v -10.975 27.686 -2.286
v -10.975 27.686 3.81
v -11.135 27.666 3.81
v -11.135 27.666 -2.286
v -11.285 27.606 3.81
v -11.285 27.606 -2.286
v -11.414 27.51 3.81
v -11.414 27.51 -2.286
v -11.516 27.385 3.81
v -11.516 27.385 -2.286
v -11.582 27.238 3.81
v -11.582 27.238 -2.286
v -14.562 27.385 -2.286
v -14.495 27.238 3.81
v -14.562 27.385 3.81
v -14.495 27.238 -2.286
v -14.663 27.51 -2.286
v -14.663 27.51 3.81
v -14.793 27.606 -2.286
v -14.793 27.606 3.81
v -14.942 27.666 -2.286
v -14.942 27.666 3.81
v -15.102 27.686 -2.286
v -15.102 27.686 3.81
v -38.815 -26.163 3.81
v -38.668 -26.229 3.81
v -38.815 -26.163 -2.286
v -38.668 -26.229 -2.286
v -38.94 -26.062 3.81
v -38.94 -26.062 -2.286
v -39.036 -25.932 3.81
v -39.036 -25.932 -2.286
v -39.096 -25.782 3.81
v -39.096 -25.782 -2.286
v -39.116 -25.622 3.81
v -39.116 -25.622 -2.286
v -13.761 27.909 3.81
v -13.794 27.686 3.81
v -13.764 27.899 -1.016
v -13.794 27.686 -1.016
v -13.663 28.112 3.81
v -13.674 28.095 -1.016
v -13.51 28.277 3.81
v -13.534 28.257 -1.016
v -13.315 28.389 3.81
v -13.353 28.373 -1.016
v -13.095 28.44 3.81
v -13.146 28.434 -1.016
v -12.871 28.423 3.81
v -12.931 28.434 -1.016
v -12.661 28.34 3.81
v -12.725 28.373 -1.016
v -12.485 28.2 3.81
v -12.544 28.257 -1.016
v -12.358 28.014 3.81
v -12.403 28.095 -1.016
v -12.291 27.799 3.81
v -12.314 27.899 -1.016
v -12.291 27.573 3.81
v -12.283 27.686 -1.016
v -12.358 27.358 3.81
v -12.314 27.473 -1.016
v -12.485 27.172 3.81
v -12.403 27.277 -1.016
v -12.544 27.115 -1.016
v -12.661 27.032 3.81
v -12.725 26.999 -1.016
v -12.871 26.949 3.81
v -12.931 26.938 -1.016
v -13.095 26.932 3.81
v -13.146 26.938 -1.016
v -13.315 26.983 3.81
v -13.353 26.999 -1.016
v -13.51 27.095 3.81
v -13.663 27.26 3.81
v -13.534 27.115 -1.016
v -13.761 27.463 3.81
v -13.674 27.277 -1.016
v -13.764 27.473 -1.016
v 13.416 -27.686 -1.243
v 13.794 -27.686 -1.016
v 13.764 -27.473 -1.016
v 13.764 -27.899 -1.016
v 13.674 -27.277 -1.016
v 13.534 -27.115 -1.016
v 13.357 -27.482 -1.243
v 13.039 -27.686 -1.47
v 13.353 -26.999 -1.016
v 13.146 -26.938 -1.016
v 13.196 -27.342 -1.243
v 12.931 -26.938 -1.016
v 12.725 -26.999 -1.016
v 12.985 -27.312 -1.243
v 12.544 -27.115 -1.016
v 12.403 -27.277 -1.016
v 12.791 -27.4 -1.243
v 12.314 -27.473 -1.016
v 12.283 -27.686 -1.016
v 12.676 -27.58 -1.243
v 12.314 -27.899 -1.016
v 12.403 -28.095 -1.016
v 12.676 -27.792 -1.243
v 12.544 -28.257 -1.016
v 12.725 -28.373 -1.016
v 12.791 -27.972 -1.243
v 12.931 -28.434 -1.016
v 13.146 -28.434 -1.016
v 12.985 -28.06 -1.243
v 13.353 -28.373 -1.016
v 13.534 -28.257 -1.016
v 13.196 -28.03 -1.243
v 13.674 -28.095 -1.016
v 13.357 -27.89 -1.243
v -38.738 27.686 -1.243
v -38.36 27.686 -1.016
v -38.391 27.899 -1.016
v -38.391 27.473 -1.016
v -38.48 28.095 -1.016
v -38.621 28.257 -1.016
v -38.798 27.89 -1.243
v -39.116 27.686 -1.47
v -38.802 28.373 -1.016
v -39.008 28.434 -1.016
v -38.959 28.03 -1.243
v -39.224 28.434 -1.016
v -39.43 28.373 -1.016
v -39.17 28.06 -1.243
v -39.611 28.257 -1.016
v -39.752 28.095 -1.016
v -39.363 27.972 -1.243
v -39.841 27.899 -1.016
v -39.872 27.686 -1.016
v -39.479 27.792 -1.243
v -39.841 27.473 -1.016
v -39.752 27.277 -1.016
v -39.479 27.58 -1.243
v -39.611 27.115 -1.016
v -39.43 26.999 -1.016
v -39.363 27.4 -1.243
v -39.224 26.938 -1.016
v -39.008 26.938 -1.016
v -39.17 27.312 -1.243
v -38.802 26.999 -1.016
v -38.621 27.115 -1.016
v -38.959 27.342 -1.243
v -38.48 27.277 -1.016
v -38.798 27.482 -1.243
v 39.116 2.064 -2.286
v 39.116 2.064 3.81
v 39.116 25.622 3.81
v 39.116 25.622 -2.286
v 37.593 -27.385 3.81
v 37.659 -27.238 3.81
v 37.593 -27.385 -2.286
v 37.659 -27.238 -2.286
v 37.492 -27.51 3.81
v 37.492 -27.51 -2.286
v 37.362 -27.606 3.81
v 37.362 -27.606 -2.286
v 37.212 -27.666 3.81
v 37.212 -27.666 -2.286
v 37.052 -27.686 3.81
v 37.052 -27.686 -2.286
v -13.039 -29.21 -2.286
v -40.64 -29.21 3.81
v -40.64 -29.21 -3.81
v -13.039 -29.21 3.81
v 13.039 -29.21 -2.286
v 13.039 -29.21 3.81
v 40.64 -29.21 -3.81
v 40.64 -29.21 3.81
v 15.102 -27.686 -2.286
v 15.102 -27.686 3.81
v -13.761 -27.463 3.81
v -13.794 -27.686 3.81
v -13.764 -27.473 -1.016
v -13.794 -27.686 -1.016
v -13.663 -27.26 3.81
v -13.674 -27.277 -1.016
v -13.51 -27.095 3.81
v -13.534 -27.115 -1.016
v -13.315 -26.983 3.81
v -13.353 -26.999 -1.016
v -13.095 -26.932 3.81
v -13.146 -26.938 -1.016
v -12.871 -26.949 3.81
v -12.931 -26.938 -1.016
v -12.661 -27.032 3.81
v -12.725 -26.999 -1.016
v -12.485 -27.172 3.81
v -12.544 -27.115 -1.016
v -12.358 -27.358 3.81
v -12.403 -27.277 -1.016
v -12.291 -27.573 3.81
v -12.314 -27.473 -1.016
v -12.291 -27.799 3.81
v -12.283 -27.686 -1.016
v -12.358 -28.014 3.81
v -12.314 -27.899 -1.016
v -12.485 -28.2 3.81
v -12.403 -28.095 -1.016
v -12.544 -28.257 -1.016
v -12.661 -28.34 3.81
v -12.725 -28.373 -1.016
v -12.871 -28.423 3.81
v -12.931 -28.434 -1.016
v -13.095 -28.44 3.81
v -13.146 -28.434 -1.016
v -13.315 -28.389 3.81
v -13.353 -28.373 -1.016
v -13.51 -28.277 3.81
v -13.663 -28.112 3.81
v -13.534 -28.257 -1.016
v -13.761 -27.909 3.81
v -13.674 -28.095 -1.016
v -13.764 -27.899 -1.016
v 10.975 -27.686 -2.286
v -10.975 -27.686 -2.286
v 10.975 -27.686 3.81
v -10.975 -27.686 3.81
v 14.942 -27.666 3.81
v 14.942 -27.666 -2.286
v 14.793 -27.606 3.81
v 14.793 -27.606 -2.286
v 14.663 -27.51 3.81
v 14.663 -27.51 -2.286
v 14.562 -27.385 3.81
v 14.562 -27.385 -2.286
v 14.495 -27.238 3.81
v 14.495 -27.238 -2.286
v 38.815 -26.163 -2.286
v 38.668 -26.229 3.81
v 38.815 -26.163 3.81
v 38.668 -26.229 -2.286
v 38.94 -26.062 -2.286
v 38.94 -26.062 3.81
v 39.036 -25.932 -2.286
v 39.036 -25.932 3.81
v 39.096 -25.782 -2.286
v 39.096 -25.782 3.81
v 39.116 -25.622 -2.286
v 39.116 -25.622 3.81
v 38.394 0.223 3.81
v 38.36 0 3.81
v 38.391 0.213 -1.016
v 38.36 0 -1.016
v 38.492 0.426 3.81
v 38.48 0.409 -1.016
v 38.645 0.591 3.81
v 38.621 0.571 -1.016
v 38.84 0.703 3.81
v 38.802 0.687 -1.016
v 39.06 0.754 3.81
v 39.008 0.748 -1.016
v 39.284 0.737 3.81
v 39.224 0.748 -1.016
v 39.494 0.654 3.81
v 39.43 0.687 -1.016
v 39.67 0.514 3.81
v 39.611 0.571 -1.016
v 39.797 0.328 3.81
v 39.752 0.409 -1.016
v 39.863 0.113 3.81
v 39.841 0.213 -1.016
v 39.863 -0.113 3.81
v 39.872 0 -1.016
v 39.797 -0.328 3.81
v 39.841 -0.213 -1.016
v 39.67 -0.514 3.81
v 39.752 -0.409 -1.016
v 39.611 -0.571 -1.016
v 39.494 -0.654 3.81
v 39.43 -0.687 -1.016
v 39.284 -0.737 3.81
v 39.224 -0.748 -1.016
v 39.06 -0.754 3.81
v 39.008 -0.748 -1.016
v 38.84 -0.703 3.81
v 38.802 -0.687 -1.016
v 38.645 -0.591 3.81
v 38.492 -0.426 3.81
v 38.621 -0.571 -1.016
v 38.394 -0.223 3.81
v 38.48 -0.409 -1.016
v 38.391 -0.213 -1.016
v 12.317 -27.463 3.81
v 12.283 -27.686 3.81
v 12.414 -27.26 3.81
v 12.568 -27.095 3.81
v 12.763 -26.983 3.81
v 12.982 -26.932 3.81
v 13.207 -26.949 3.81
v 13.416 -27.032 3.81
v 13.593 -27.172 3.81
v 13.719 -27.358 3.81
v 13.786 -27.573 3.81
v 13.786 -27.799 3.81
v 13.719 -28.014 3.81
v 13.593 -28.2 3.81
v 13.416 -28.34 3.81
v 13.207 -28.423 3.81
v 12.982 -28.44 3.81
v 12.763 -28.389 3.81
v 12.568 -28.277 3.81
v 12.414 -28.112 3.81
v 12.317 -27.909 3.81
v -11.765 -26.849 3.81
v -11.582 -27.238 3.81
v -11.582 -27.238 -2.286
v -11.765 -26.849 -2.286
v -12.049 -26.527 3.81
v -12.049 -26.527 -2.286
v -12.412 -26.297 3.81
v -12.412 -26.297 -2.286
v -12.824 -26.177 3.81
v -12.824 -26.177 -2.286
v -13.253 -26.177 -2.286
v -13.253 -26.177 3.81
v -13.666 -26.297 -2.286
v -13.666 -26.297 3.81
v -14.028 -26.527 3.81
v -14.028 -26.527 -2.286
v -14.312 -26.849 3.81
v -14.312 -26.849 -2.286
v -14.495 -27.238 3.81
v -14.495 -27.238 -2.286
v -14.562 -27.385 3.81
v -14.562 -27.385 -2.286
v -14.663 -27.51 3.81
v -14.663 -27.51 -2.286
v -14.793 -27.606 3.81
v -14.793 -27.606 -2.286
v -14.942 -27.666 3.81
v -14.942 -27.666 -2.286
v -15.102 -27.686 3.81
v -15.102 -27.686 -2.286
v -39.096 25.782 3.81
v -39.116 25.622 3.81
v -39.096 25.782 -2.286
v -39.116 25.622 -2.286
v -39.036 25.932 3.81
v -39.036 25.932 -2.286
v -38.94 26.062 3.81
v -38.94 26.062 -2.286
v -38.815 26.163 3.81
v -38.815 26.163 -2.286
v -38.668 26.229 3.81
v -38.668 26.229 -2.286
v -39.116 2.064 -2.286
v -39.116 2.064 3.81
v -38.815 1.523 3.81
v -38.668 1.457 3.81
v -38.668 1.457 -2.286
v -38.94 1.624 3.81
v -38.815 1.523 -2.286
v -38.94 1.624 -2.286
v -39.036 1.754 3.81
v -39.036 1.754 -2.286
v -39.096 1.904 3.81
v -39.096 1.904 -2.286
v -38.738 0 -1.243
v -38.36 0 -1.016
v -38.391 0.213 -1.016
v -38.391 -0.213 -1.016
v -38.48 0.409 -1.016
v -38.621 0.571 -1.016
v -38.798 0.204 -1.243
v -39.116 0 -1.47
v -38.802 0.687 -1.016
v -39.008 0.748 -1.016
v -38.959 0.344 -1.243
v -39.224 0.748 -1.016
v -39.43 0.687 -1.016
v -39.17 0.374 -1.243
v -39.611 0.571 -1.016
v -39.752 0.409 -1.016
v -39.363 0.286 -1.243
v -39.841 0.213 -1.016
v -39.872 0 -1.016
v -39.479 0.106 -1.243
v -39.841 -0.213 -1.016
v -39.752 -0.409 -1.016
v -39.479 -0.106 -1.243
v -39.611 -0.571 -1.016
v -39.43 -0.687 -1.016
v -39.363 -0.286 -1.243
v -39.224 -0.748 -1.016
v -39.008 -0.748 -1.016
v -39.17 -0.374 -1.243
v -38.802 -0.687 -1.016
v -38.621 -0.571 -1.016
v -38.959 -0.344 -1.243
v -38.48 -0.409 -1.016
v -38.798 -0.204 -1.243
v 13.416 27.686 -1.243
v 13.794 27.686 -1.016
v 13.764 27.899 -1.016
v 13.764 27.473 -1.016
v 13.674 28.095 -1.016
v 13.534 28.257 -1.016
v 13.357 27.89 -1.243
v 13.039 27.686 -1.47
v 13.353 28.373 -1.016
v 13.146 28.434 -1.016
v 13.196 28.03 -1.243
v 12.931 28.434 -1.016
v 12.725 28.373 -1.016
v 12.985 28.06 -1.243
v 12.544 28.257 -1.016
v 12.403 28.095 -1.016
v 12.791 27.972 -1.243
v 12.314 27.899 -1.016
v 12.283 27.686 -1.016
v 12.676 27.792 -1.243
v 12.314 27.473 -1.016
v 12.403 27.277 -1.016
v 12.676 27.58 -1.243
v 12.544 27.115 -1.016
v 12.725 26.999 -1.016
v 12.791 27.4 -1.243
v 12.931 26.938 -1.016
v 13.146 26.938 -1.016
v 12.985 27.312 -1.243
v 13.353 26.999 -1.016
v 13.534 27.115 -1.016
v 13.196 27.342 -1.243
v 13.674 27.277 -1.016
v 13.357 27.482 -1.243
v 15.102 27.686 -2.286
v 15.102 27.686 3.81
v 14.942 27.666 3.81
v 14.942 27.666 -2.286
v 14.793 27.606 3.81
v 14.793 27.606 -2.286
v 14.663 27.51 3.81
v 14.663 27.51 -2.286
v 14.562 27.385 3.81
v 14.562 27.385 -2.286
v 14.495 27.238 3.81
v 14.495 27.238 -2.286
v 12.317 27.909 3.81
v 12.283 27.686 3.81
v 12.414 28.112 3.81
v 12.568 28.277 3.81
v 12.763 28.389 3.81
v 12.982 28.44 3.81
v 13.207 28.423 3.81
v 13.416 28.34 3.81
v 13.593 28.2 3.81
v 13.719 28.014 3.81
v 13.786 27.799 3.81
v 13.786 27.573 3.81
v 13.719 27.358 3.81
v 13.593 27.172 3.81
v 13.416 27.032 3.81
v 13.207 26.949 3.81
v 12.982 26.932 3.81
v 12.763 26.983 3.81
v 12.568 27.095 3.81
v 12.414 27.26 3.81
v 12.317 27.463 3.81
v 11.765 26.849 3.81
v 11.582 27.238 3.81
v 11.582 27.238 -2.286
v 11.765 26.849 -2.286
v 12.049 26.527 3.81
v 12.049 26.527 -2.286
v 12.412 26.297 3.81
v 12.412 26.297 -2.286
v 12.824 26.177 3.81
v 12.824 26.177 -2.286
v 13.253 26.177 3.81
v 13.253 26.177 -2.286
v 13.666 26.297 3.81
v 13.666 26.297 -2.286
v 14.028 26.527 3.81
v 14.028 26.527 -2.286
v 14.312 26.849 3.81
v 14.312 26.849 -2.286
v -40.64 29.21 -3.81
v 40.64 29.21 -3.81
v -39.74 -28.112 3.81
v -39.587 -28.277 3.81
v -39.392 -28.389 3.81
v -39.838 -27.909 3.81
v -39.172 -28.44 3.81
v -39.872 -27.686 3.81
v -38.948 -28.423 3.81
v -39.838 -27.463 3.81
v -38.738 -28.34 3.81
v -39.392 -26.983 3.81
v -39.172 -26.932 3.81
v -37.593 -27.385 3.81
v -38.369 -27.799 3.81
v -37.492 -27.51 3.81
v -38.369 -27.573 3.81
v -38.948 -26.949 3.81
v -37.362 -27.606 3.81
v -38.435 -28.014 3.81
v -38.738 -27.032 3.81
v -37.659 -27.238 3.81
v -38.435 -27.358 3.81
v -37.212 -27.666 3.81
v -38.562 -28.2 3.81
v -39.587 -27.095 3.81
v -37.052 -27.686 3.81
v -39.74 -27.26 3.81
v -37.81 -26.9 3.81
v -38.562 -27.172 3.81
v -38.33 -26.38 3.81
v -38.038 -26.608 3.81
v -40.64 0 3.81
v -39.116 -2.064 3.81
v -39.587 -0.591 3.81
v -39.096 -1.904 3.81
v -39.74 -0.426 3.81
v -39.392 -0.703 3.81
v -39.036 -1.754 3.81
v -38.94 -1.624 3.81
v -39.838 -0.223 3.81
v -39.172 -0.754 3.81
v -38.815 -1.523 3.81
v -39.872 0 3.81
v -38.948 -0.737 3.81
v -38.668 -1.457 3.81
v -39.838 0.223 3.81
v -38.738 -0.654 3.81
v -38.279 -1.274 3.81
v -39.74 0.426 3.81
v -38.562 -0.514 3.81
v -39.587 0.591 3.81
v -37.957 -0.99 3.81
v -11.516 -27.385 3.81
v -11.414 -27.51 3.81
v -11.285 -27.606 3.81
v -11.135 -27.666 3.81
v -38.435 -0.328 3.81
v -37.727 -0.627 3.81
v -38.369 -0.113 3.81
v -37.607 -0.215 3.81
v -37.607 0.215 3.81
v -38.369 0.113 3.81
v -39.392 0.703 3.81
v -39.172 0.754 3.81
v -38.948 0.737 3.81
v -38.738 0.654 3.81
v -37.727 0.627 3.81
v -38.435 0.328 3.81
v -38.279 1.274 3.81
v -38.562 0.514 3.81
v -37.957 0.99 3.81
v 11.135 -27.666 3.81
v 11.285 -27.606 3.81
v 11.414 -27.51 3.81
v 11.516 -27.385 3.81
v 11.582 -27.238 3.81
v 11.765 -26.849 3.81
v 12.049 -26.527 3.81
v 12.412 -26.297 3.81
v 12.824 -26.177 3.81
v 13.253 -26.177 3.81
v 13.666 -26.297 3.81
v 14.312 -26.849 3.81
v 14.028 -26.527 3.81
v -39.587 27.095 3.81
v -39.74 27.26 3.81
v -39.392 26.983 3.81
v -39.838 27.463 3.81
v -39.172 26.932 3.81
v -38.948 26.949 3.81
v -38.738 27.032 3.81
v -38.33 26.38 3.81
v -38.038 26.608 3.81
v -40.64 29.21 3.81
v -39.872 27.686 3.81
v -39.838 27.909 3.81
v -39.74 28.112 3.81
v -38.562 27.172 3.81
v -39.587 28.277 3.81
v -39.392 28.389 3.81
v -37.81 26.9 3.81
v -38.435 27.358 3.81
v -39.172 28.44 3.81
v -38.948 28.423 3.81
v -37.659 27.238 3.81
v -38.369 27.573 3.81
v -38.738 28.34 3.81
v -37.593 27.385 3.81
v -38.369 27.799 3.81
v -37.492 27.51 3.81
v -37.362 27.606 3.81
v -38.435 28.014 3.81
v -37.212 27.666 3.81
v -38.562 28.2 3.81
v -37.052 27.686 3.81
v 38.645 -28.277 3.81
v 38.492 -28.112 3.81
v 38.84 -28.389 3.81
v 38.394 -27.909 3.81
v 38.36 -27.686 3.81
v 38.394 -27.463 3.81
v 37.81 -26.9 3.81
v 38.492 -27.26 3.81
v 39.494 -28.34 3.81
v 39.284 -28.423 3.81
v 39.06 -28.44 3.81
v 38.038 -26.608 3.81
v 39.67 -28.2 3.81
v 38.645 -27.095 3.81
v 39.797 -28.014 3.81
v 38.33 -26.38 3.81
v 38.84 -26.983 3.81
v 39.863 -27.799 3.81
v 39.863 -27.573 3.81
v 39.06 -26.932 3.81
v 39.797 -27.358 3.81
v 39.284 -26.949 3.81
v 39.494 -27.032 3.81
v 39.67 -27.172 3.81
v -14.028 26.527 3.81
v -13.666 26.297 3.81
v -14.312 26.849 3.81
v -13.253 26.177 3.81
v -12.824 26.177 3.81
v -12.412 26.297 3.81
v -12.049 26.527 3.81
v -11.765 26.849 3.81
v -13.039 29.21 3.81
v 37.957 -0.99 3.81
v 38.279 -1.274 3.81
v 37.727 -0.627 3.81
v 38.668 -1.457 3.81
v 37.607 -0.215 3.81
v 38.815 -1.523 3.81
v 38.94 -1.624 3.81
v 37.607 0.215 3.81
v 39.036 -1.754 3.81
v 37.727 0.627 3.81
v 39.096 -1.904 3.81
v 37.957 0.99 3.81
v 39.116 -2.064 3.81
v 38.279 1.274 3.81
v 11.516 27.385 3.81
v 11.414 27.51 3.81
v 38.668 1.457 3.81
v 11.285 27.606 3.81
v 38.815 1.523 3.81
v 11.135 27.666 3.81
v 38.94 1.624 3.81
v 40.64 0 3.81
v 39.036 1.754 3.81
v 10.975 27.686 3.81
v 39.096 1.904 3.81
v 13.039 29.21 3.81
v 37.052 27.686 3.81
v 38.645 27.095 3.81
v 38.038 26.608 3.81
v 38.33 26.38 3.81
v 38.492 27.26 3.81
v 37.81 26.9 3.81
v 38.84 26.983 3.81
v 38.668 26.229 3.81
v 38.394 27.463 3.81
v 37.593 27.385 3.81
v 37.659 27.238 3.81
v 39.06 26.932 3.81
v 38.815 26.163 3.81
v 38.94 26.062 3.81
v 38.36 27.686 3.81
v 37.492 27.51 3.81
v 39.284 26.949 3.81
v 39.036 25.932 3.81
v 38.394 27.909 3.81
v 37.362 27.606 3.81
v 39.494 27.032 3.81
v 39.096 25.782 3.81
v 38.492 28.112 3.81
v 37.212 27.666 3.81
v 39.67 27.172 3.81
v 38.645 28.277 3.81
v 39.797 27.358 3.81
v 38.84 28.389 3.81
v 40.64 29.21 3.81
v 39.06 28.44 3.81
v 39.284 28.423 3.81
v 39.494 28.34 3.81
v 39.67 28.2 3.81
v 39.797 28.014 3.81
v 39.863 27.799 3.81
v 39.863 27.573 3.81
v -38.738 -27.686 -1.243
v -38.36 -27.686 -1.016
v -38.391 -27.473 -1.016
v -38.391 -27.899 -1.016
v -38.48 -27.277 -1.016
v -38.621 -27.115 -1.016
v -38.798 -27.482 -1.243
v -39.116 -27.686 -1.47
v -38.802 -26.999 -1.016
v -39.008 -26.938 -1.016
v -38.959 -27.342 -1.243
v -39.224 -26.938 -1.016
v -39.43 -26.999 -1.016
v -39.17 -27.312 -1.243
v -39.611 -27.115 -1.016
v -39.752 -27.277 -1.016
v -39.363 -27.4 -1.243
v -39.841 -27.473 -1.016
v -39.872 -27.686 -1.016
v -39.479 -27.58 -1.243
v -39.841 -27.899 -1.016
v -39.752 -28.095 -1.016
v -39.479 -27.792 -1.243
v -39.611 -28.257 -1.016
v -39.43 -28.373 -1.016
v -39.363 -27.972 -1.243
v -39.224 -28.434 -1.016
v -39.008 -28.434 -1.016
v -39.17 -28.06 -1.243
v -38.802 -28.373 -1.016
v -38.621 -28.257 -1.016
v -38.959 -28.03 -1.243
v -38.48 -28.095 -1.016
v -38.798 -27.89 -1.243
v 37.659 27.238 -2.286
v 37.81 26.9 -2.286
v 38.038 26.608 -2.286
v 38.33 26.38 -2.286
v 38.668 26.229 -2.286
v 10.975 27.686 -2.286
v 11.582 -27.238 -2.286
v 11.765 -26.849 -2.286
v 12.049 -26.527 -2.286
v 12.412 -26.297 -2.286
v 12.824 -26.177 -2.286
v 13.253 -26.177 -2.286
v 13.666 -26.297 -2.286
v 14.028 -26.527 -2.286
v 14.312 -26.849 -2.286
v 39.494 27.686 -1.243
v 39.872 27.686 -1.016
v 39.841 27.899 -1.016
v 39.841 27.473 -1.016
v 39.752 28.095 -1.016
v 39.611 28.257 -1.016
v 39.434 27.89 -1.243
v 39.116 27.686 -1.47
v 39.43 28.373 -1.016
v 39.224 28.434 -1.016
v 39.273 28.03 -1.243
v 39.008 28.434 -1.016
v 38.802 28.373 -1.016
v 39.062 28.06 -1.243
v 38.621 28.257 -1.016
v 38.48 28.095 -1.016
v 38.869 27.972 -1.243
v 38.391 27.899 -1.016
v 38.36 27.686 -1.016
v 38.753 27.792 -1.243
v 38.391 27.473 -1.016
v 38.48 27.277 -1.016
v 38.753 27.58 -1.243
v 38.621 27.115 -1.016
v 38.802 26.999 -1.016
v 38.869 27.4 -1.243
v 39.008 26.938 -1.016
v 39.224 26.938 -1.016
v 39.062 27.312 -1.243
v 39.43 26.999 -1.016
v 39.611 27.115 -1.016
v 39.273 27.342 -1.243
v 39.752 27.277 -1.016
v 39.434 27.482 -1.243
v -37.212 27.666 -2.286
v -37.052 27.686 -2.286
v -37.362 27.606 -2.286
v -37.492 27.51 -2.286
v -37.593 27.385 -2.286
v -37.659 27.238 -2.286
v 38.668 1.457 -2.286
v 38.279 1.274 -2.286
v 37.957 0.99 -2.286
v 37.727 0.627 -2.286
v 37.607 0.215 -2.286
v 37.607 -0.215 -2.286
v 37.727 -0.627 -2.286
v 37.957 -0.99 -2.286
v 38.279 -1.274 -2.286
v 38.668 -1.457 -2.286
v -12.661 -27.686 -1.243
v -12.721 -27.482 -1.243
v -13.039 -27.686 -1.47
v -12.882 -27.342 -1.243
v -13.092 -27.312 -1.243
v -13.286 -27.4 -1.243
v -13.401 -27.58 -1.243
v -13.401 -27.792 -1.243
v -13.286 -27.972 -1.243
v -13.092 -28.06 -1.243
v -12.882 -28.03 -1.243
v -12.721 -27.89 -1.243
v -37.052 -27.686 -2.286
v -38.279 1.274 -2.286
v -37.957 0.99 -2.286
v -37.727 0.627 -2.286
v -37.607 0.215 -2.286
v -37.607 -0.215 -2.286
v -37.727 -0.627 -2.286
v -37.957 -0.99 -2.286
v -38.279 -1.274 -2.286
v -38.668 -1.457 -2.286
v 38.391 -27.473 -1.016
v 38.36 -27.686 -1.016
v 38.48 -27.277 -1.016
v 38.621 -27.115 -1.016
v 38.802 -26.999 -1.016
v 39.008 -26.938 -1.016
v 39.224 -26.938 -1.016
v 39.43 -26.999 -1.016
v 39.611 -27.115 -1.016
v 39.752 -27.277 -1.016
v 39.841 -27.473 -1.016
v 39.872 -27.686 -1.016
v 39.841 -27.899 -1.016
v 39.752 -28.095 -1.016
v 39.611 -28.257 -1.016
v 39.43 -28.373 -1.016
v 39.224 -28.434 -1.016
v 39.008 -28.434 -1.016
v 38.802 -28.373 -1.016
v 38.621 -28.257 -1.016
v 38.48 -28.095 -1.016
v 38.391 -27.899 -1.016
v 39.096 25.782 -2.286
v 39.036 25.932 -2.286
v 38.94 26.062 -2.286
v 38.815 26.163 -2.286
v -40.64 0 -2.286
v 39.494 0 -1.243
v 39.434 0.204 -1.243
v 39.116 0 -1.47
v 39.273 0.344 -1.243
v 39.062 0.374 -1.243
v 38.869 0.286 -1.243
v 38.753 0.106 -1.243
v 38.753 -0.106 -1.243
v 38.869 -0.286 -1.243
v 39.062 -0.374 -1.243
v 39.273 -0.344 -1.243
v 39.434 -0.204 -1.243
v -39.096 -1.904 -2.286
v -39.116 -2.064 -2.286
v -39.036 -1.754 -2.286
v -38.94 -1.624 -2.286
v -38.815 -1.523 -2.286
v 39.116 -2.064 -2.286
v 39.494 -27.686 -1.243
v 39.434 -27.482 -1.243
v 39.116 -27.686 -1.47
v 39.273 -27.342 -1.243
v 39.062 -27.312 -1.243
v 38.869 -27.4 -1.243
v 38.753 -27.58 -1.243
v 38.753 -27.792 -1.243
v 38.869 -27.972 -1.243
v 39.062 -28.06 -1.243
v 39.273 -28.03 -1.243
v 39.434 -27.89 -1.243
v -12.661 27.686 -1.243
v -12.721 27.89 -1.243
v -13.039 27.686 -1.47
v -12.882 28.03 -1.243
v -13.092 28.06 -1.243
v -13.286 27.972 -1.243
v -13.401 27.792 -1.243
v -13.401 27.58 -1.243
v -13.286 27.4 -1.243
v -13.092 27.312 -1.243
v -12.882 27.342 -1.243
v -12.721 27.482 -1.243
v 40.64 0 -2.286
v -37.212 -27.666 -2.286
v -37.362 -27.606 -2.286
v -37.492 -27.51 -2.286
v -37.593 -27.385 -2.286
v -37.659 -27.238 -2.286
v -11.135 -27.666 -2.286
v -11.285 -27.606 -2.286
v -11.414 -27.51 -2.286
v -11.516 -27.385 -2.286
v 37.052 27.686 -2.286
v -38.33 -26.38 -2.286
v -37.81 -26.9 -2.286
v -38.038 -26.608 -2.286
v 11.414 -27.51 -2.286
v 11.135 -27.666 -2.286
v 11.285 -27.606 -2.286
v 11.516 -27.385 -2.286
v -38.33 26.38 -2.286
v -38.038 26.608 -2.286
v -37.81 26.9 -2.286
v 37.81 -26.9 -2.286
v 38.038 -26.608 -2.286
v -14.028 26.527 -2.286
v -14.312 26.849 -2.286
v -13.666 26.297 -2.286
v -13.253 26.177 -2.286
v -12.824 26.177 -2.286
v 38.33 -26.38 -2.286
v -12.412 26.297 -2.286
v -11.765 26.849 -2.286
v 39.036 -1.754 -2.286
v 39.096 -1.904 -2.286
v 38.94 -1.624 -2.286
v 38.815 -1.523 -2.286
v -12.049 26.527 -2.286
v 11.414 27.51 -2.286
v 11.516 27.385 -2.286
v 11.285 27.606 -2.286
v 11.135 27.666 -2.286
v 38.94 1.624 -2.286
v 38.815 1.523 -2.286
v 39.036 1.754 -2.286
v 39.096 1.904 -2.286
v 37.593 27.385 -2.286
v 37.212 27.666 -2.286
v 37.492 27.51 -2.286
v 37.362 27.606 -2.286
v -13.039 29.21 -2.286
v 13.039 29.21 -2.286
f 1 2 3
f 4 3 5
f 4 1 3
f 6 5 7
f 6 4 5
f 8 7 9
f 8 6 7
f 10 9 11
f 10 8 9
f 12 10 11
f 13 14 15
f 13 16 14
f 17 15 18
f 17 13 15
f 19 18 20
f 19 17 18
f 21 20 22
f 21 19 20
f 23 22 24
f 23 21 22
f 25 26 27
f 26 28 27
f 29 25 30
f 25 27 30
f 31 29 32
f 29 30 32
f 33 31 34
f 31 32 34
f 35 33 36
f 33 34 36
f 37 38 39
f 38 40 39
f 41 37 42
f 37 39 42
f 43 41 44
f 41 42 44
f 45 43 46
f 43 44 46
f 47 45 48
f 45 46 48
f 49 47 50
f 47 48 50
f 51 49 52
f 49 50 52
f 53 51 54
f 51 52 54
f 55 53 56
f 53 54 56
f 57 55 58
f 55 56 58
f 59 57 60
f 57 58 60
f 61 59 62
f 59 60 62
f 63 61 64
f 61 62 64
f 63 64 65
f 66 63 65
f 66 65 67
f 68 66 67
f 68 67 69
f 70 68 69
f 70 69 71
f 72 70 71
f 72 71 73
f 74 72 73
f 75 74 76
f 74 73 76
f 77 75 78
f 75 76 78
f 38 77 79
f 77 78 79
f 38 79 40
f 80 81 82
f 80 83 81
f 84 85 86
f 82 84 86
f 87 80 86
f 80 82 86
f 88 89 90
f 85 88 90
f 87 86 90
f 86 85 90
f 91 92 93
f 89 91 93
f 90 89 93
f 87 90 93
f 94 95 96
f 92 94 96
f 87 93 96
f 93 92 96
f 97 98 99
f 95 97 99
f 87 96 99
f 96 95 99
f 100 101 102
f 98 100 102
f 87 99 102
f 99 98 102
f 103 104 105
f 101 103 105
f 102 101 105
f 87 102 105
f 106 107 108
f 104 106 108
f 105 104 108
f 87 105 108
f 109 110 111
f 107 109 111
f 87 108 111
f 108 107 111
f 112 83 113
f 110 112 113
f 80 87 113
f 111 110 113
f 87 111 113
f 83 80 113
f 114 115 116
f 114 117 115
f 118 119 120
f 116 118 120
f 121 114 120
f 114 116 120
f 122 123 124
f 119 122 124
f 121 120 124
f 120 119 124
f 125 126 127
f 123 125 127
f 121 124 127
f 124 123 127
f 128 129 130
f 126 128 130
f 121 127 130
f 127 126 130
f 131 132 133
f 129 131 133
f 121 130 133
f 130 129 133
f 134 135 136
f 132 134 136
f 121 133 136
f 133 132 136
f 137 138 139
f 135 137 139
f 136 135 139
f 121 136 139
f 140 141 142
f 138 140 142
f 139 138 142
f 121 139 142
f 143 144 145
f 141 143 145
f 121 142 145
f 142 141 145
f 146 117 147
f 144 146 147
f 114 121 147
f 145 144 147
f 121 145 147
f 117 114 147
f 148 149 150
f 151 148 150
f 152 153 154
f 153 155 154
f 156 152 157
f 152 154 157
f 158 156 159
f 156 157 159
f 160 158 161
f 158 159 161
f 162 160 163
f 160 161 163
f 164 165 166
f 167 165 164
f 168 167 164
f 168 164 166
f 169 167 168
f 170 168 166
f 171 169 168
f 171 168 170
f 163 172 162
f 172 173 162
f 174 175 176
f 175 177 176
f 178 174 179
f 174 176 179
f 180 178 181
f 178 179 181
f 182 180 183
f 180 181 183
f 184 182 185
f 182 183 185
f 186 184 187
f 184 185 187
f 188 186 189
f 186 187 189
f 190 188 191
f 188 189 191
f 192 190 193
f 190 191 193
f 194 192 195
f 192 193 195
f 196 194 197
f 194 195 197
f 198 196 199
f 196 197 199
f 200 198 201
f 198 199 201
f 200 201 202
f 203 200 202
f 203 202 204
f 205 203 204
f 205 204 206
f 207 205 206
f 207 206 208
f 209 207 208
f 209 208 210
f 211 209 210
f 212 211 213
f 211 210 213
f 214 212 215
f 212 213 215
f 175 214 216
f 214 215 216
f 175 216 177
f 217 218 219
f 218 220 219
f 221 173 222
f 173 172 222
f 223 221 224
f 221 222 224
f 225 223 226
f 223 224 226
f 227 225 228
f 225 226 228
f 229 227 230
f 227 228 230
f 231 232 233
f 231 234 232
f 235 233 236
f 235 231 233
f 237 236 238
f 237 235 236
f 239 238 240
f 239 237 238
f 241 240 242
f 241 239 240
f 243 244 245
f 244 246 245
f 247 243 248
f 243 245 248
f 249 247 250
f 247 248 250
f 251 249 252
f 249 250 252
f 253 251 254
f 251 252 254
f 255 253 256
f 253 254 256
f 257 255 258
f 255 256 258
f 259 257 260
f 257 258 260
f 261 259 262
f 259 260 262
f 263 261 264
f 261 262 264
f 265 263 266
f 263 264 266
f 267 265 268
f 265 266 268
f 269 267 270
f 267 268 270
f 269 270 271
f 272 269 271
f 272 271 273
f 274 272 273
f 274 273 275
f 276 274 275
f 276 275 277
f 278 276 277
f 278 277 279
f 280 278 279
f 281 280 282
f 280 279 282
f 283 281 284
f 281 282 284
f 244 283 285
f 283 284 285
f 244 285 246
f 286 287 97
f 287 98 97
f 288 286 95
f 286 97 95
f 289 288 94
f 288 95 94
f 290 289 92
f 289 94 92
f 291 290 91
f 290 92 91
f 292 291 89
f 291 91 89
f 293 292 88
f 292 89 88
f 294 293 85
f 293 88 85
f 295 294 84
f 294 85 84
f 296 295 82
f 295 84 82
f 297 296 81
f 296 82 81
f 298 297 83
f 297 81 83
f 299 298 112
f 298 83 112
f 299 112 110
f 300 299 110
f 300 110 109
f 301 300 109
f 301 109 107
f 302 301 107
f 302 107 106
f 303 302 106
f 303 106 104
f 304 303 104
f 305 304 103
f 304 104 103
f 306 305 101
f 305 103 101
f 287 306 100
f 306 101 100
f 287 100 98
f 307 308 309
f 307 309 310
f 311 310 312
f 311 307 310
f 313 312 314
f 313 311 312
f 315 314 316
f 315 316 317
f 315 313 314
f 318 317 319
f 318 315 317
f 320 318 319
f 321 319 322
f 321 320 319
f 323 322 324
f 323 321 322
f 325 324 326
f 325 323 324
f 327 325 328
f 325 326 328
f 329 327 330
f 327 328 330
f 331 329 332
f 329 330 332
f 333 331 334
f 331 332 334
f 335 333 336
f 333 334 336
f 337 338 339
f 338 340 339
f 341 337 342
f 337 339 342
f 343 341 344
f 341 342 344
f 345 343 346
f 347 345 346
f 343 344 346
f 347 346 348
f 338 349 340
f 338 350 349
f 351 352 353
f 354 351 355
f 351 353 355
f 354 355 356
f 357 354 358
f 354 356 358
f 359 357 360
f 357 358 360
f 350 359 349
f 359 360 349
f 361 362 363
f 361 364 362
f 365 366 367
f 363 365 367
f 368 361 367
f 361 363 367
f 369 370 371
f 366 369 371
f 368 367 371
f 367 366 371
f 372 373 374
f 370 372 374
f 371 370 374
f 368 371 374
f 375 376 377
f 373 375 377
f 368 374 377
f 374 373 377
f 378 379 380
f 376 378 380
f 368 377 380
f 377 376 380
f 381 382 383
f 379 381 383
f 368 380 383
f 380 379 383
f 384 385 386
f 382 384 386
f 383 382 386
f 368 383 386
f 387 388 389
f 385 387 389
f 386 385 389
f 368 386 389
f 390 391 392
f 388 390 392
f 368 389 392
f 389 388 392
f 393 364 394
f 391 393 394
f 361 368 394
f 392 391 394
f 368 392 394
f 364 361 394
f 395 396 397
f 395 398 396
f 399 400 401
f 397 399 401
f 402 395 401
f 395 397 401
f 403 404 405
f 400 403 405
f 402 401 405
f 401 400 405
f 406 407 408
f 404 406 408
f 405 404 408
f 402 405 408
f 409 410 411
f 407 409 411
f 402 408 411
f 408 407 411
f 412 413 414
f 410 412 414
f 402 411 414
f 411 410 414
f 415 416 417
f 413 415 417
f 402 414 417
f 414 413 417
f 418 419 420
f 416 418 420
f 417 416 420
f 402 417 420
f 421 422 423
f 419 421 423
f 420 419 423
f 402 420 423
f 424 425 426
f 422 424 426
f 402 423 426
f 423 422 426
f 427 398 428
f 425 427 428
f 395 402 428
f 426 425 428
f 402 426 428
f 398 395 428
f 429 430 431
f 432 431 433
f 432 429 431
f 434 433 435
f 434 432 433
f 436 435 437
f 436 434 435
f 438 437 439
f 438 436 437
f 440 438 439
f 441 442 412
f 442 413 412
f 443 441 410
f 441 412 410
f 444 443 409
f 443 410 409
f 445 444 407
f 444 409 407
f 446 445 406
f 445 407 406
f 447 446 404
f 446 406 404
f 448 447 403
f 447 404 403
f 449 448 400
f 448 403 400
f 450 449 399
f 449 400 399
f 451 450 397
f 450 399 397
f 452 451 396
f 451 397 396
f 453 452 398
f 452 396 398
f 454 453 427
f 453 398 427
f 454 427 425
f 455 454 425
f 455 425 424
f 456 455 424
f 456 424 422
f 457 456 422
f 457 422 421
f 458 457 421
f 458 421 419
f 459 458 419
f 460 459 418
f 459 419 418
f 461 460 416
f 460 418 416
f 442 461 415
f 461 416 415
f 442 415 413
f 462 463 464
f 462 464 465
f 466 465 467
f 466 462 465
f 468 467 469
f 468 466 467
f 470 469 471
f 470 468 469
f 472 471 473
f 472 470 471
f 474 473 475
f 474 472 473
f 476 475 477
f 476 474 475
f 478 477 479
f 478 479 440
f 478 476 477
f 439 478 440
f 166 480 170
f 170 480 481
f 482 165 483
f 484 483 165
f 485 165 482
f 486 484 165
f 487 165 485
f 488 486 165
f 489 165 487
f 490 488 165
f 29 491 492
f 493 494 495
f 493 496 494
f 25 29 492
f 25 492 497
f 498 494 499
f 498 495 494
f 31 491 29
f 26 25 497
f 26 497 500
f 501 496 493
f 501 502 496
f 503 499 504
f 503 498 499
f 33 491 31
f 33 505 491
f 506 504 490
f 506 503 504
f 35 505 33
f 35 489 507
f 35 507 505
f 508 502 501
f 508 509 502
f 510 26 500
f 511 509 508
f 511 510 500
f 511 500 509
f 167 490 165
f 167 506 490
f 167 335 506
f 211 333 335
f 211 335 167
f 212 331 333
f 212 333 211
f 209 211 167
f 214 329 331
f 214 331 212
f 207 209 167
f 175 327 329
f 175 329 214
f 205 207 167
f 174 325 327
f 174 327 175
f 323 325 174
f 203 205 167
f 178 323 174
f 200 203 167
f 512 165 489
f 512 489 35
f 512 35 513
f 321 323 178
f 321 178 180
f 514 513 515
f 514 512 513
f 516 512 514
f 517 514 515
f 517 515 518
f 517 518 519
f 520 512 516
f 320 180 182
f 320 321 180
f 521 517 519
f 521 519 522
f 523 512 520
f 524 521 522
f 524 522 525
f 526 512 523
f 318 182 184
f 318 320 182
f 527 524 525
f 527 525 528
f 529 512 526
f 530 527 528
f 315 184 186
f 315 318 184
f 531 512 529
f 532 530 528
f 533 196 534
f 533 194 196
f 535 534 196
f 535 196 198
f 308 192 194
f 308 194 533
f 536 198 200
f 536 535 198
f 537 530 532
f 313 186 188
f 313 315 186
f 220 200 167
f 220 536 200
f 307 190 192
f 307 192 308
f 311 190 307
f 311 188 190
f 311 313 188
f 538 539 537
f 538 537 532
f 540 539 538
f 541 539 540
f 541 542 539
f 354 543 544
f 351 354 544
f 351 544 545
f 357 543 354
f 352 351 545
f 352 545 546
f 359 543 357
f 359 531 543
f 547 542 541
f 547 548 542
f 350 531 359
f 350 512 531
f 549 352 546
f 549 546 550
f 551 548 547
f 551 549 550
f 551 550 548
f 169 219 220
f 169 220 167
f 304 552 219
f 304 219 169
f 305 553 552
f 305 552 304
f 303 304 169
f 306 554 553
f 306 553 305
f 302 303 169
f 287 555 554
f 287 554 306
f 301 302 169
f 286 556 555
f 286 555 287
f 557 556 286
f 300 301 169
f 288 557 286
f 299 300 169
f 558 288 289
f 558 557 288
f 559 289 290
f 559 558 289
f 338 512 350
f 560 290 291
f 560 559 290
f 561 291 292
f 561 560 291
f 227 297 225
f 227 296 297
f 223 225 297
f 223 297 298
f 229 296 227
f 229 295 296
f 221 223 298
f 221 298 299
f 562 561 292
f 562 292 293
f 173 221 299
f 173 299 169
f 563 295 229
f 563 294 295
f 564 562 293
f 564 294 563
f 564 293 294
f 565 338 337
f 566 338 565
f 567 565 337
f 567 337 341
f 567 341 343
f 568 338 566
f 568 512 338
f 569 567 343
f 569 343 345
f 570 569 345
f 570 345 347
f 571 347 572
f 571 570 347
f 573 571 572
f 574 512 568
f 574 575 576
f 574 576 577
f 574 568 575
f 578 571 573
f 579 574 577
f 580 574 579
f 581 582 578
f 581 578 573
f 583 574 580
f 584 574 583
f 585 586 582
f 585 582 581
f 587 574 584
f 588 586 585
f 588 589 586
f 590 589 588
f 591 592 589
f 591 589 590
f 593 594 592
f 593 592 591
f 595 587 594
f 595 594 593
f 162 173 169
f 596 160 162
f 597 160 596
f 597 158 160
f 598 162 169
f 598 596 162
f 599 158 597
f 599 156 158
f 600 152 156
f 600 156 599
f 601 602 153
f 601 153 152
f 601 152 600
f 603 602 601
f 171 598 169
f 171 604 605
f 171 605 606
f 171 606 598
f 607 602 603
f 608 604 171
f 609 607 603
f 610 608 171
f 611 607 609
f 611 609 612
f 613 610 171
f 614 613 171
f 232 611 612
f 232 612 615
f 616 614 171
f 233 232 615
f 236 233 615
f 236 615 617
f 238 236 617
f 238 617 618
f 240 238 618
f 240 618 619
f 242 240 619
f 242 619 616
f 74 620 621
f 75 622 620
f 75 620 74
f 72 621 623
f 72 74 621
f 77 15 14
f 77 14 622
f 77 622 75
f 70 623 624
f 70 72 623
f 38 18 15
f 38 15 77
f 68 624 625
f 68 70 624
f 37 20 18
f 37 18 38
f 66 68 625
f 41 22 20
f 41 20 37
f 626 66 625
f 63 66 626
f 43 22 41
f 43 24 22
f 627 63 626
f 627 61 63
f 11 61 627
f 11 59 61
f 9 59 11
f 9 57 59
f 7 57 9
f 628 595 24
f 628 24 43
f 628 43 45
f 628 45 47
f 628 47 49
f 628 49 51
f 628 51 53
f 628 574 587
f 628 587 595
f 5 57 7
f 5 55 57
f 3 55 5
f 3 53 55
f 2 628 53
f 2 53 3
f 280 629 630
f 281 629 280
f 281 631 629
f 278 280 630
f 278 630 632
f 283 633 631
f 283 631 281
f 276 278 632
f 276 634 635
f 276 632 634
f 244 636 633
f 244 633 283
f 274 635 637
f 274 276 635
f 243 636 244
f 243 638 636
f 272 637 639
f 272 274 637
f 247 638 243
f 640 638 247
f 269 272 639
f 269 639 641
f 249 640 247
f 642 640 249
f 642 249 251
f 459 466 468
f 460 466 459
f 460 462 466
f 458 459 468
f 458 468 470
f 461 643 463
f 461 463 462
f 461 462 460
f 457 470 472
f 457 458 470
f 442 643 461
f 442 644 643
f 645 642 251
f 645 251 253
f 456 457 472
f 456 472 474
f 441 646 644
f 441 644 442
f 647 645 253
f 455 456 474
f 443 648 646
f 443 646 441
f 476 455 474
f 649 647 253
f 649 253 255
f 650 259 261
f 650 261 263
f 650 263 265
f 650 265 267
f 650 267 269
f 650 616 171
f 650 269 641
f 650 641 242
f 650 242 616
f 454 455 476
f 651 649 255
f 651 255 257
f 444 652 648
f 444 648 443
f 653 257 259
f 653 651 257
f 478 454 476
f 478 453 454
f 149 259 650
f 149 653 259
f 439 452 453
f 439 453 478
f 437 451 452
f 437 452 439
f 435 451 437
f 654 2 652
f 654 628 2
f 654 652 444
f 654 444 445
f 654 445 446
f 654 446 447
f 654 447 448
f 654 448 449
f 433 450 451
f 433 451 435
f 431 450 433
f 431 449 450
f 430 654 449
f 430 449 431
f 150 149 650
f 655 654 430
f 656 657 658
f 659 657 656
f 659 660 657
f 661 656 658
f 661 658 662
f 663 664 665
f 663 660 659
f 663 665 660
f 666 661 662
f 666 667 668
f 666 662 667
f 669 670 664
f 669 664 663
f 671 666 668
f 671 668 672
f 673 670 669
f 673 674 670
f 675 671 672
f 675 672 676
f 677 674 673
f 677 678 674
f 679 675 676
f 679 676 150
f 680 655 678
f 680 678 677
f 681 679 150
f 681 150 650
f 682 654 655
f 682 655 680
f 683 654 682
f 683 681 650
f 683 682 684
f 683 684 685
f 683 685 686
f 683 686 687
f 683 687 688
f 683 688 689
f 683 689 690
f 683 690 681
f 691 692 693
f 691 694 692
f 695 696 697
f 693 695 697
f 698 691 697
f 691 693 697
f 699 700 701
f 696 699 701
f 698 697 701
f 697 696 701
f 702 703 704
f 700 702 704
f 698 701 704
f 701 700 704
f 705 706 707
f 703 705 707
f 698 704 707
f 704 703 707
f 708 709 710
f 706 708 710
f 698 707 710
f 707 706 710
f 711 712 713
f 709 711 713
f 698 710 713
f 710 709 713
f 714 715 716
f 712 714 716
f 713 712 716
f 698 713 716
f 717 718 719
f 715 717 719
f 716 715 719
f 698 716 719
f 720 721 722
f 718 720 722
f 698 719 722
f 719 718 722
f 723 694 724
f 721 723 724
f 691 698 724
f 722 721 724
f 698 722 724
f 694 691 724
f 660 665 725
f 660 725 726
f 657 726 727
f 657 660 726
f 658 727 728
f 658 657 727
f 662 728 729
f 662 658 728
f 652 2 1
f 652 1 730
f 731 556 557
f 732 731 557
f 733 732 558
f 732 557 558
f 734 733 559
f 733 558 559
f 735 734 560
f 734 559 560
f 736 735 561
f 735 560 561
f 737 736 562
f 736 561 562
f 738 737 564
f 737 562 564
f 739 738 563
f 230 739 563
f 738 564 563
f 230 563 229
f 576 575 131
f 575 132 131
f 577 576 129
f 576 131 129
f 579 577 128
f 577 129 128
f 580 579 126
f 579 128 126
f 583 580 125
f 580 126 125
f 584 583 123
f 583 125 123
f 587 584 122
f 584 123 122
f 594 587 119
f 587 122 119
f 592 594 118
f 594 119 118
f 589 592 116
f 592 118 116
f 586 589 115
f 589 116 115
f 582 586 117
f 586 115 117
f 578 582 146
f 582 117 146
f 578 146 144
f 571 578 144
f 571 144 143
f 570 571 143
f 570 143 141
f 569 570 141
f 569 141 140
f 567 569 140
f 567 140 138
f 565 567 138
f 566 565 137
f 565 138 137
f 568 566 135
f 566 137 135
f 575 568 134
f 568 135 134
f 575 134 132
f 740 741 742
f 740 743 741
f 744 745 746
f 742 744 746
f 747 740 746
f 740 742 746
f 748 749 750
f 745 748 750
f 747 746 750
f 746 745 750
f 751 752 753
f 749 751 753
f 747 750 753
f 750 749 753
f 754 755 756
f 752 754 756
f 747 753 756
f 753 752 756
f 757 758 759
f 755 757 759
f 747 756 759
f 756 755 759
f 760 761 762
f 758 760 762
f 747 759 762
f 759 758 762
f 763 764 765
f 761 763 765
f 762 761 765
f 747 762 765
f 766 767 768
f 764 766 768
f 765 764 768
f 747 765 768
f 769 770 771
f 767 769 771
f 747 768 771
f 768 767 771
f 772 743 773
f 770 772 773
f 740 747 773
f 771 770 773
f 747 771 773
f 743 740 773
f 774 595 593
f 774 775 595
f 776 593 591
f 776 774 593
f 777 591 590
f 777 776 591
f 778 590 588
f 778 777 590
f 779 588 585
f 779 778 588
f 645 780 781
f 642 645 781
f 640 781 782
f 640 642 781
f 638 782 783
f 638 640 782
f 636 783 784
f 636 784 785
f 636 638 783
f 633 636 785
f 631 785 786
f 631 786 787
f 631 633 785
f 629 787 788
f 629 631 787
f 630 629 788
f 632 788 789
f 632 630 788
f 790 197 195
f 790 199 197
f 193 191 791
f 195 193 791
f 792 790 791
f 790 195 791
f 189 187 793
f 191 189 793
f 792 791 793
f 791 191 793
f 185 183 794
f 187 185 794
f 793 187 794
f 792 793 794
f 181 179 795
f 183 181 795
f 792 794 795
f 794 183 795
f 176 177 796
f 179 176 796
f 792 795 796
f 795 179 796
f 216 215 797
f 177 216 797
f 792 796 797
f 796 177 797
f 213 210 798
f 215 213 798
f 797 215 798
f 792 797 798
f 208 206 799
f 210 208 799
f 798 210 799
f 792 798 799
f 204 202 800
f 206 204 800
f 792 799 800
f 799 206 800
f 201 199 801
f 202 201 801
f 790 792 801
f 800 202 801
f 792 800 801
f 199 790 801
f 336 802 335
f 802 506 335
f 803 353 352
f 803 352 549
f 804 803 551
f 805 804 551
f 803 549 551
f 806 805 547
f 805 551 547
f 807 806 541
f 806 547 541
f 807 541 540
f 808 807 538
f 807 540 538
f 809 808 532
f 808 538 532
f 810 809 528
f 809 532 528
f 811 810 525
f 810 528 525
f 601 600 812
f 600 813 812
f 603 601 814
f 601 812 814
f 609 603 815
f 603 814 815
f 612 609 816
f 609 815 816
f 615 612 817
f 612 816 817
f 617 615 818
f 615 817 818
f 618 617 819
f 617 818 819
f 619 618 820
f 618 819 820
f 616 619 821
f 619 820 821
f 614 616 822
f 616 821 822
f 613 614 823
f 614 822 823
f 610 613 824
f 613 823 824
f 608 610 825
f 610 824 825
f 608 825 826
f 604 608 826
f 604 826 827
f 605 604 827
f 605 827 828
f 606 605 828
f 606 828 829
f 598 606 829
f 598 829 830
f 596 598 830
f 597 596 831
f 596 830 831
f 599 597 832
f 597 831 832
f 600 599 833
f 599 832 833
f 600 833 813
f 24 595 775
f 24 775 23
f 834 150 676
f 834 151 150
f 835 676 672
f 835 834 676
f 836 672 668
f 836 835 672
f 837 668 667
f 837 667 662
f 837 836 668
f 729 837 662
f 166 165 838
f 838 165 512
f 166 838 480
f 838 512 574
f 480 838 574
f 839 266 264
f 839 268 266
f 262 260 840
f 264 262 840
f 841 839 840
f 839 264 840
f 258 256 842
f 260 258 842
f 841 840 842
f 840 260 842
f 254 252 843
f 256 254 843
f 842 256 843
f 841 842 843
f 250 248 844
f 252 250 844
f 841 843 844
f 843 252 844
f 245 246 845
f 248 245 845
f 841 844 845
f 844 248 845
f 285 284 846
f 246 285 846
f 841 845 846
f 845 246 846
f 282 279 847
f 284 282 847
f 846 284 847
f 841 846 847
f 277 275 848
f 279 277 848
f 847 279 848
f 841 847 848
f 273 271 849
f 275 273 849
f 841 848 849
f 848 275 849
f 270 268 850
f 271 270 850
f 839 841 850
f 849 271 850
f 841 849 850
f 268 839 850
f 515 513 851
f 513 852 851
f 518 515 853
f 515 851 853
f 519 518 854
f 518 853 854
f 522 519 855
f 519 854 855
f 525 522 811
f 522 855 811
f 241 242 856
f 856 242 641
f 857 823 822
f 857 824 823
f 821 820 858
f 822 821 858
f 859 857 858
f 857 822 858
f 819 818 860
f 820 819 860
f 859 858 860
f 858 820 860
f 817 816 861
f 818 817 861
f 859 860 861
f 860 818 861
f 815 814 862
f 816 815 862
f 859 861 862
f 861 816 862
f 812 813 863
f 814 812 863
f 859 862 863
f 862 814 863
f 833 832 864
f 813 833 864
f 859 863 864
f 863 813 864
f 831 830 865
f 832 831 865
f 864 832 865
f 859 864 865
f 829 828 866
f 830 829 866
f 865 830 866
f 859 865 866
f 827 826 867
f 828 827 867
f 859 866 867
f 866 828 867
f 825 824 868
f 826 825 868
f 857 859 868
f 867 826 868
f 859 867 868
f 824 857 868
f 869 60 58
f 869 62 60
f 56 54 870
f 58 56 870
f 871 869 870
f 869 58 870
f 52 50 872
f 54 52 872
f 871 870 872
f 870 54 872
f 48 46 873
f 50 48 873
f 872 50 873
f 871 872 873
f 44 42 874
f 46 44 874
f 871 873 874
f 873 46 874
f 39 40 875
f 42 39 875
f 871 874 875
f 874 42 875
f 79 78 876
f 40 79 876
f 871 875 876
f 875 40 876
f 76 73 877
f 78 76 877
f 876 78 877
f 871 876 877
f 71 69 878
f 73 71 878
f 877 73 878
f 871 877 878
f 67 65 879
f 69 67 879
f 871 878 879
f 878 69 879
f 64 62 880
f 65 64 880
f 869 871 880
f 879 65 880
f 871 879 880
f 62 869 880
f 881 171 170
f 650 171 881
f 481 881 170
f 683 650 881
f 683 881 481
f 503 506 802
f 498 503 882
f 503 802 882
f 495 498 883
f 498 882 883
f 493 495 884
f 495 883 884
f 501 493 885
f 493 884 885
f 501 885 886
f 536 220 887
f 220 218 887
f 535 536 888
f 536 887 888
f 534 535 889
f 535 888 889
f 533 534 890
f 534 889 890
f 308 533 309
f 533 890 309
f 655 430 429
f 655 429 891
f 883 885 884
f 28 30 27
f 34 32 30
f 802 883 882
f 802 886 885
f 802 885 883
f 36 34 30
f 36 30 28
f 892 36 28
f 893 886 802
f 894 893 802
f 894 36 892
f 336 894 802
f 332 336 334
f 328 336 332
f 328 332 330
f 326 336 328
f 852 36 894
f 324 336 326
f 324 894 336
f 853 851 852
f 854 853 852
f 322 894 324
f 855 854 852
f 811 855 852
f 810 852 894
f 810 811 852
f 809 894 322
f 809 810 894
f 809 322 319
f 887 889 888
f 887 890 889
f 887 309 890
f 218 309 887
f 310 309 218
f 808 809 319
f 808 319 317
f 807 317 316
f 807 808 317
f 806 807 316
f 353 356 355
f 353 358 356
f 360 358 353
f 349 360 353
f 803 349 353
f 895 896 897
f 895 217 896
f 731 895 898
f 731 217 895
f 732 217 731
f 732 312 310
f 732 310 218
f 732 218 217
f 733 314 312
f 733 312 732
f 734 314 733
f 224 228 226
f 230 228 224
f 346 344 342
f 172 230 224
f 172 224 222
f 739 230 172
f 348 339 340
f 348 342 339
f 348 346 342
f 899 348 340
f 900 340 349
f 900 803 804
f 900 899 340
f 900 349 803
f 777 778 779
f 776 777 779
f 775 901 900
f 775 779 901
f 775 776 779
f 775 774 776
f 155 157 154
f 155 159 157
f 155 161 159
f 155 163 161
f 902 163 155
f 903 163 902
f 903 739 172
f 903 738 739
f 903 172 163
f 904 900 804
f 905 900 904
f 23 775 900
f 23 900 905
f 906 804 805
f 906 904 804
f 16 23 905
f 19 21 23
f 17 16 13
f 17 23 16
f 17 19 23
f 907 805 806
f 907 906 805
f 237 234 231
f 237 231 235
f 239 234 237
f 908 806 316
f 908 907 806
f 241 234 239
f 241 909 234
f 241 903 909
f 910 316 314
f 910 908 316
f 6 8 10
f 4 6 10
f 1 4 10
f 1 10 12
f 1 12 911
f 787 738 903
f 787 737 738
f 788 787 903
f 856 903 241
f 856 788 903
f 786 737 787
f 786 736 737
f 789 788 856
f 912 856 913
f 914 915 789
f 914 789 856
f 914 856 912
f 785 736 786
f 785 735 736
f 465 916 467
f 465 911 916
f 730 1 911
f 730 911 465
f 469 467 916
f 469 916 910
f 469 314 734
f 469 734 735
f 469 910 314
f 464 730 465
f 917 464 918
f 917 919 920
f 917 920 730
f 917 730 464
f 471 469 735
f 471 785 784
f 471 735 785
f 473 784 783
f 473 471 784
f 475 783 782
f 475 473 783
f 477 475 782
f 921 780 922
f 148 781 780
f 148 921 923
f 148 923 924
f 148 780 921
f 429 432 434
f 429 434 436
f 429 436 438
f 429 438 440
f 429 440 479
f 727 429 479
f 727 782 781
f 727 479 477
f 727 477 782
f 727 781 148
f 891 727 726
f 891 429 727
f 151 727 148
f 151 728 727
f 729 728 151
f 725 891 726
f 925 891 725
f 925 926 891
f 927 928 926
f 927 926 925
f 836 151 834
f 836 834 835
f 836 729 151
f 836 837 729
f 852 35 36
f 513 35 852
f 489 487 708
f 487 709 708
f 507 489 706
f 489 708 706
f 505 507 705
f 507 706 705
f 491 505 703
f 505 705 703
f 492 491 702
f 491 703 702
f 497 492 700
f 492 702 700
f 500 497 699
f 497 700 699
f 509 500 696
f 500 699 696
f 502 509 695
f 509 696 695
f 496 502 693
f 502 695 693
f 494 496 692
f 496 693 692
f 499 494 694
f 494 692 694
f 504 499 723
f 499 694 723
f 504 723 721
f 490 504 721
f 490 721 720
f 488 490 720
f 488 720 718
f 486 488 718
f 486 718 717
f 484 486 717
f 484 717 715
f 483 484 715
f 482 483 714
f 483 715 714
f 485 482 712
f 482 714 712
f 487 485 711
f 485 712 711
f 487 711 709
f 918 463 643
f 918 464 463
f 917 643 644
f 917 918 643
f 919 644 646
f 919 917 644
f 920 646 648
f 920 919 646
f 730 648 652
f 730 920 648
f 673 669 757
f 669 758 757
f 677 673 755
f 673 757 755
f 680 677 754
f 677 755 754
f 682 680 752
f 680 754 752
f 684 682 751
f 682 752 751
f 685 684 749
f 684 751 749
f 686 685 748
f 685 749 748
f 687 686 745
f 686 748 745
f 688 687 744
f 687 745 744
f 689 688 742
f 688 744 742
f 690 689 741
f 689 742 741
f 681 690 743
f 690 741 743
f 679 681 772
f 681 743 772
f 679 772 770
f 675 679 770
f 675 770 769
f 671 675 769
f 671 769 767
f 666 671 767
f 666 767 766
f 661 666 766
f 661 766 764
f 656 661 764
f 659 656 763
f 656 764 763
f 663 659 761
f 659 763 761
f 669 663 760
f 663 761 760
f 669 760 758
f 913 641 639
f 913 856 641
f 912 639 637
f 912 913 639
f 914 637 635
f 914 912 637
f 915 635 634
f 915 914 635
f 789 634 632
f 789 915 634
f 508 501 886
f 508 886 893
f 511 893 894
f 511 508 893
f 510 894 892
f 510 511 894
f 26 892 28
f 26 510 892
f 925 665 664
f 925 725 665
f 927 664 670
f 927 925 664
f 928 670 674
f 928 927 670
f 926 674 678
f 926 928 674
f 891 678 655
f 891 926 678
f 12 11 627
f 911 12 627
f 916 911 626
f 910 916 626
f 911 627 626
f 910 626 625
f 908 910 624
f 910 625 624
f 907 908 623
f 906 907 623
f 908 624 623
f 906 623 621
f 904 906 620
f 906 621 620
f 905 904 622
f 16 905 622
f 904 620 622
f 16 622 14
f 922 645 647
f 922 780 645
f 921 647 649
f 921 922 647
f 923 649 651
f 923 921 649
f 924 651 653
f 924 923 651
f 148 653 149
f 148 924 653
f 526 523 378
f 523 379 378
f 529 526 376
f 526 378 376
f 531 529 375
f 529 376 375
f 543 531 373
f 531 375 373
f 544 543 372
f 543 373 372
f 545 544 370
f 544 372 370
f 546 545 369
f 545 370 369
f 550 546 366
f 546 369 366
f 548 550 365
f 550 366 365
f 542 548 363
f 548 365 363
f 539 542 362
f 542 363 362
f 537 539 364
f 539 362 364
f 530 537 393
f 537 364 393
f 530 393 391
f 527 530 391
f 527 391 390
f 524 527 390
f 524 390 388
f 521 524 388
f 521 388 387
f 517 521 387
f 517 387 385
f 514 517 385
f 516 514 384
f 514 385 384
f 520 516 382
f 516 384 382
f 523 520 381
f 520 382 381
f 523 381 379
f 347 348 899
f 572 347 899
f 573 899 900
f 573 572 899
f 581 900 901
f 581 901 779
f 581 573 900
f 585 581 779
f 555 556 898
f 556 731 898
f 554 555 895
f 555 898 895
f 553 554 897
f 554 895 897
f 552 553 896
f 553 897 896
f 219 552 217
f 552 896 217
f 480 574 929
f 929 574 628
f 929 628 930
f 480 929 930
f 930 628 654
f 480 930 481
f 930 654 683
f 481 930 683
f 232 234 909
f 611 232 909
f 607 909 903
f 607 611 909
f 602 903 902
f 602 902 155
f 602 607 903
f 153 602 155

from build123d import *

# Parameters (mm, degrees)
F0_W             = 81.28
F0_H             = 58.42
F1_DEPTH         = 3.81
F2_T             = -1.524
F4_DEPTH         = 6.096
F4_COPIES2_COUNT = 2
F6_D             = 1.5113
F6_DEPTH         = 4.826
F6_TIP           = 0.4540403268
F7_R             = 0.635


# Not quite as in the source:
# - a pattern or mirror of a feature is missing from the dataset's text; its kind, count and spacing are read off the source's solid


with BuildPart() as f1:
    # F0 (on Top) → F1 (new body, symmetric)
    with BuildSketch(Plane.XY):
        Rectangle(F0_W, F0_H)
    extrude(amount=F1_DEPTH, both=True)

    # F2
    f2_openings = [f1.faces().sort_by_distance(p)[0] for p in [
        (0, 0, 3.81),
    ]]
    offset(amount=F2_T, openings=f2_openings)

    # F3 (on face) → F4 (join, through all)
    with BuildSketch(Plane.XY.offset(3.81)):
        with BuildLine():
            ThreePointArc((-39.116, 26.162), (-38.0383692655, 26.6083692655), (-37.592, 27.686))
            Line((-37.592, 27.686), (-39.116, 27.686))
            Line((-39.116, 27.686), (-39.116, 26.162))
        make_face()
        with BuildLine():
            ThreePointArc((-13.0386666835, 29.21), (-14.1162974072, 28.7636307286), (-14.5626666667, 27.686))
            Line((-14.5626666667, 27.686), (-11.5146666667, 27.686))
            ThreePointArc((-11.5146666667, 27.686), (-11.9610359381, 28.7636307405), (-13.0386666835, 29.21))
        make_face()
        with BuildLine():
            Line((-39.116, -1.524), (-39.116, 1.524))
            ThreePointArc((-39.116, 1.524), (-40.1936307323, 1.0776307368), (-40.64, 6.4e-09))
            ThreePointArc((-40.64, 6.4e-09), (-40.1936307368, -1.0776307323), (-39.116, -1.524))
        make_face()
        with BuildLine():
            ThreePointArc((14.5626666667, 27.686), (14.1162974012, 28.7636307345), (13.0386666667, 29.21))
            ThreePointArc((13.0386666667, 29.21), (11.9610359321, 28.7636307345), (11.5146666667, 27.686))
            Line((11.5146666667, 27.686), (14.5626666667, 27.686))
        make_face()
        with BuildLine():
            Line((14.5626666667, 27.686), (11.5146666667, 27.686))
            ThreePointArc((11.5146666667, 27.686), (13.0386666667, 26.162), (14.5626666667, 27.686))
        make_face()
        with BuildLine():
            ThreePointArc((-37.592, -27.686), (-38.0383692655, -26.6083692655), (-39.116, -26.162))
            Line((-39.116, -26.162), (-39.116, -27.686))
            Line((-39.116, -27.686), (-37.592, -27.686))
        make_face()
        with BuildLine():
            Line((39.116, 27.686), (37.592, 27.686))
            ThreePointArc((37.592, 27.686), (38.0383692655, 26.6083692655), (39.116, 26.162))
            Line((39.116, 26.162), (39.116, 27.686))
        make_face()
        with BuildLine():
            ThreePointArc((-14.5626666667, -27.686), (-14.1162973989, -28.7636307368), (-13.0386666602, -29.21))
            ThreePointArc((-13.0386666602, -29.21), (-11.9610359299, -28.7636307323), (-11.5146666667, -27.686))
            Line((-11.5146666667, -27.686), (-14.5626666667, -27.686))
        make_face()
        with BuildLine():
            ThreePointArc((11.5146666667, -27.686), (11.9610359295, -28.7636307319), (13.0386666593, -29.21))
            ThreePointArc((13.0386666593, -29.21), (14.1162973986, -28.7636307371), (14.5626666667, -27.686))
            Line((14.5626666667, -27.686), (11.5146666667, -27.686))
        make_face()
        with BuildLine():
            Line((39.116, -1.524), (39.116, 1.524))
            ThreePointArc((39.116, 1.524), (37.592, 0), (39.116, -1.524))
        make_face()
        with BuildLine():
            Line((39.116, -27.686), (39.116, -26.162))
            ThreePointArc((39.116, -26.162), (38.0383692655, -26.6083692655), (37.592, -27.686))
            Line((37.592, -27.686), (39.116, -27.686))
        make_face()
    f4 = extrude(amount=-F4_DEPTH)

    # F4_copies: F4 across plane
    add(f4.mirror(Plane(origin=(0, 0, 0), x_dir=(0, 0, -1), z_dir=(-1, 0, 0))))

    # F4_copies1: F4 across plane
    add(f4.mirror(Plane(origin=(0, 0, 0), x_dir=(0, 0, -1), z_dir=(0, -1, 0))))

    # F4_copies2: F4 ×2 about axis
    f4_copies2_axis = Axis((0, 0, 0), (0, 0, 1))
    for i in range(1, F4_COPIES2_COUNT):
        add(f4.rotate(f4_copies2_axis, i * 360 / F4_COPIES2_COUNT))

    # F6
    with Locations(Plane.XY.offset(3.81)):
        with Locations((-39.116, 27.686), (-13.0386666667, 27.686), (13.0386666667, 27.686), (39.116, 27.686), (39.116, 0), (39.116, -27.686), (13.0386666667, -27.686), (-13.0386666667, -27.686), (-39.116, -27.686), (-39.116, 0)):
            Hole(F6_D / 2, depth=F6_DEPTH)
            with Locations((0, 0, -(F6_DEPTH + F6_TIP / 2))):  # 118° drill point
                Cone(0, F6_D / 2, F6_TIP, mode=Mode.SUBTRACT)

    # F7
    f7_edges = [f1.edges().sort_by_distance(p)[0] for p in [
        (-37.592, 27.686, 0.762),
        (-11.514667, 27.686, 0.762),
        (14.562667, 27.686, 0.762),
        (37.592, 27.686, 0.762),
        (40.64, 0, 0.762),
        (39.116, -26.162, 0.762),
        (37.592, -27.686, 0.762),
        (14.562667, -27.686, 0.762),
        (-11.514667, -27.686, 0.762),
        (-37.592, -27.686, 0.762),
        (39.116, 26.162, 0.762),
        (39.116, 1.524, 0.762),
        (39.116, -1.524, 0.762),
        (11.514667, 27.686, 0.762),
        (11.514667, -27.686, 0.762),
        (-14.562667, 27.686, 0.762),
        (-14.562667, -27.686, 0.762),
        (-39.116, 26.162, 0.762),
        (-39.116, 1.524, 0.762),
        (-39.116, -26.162, 0.762),
        (-39.116, -1.524, 0.762),
    ]]
    fillet(f7_edges, radius=F7_R)


solid = f1.part
